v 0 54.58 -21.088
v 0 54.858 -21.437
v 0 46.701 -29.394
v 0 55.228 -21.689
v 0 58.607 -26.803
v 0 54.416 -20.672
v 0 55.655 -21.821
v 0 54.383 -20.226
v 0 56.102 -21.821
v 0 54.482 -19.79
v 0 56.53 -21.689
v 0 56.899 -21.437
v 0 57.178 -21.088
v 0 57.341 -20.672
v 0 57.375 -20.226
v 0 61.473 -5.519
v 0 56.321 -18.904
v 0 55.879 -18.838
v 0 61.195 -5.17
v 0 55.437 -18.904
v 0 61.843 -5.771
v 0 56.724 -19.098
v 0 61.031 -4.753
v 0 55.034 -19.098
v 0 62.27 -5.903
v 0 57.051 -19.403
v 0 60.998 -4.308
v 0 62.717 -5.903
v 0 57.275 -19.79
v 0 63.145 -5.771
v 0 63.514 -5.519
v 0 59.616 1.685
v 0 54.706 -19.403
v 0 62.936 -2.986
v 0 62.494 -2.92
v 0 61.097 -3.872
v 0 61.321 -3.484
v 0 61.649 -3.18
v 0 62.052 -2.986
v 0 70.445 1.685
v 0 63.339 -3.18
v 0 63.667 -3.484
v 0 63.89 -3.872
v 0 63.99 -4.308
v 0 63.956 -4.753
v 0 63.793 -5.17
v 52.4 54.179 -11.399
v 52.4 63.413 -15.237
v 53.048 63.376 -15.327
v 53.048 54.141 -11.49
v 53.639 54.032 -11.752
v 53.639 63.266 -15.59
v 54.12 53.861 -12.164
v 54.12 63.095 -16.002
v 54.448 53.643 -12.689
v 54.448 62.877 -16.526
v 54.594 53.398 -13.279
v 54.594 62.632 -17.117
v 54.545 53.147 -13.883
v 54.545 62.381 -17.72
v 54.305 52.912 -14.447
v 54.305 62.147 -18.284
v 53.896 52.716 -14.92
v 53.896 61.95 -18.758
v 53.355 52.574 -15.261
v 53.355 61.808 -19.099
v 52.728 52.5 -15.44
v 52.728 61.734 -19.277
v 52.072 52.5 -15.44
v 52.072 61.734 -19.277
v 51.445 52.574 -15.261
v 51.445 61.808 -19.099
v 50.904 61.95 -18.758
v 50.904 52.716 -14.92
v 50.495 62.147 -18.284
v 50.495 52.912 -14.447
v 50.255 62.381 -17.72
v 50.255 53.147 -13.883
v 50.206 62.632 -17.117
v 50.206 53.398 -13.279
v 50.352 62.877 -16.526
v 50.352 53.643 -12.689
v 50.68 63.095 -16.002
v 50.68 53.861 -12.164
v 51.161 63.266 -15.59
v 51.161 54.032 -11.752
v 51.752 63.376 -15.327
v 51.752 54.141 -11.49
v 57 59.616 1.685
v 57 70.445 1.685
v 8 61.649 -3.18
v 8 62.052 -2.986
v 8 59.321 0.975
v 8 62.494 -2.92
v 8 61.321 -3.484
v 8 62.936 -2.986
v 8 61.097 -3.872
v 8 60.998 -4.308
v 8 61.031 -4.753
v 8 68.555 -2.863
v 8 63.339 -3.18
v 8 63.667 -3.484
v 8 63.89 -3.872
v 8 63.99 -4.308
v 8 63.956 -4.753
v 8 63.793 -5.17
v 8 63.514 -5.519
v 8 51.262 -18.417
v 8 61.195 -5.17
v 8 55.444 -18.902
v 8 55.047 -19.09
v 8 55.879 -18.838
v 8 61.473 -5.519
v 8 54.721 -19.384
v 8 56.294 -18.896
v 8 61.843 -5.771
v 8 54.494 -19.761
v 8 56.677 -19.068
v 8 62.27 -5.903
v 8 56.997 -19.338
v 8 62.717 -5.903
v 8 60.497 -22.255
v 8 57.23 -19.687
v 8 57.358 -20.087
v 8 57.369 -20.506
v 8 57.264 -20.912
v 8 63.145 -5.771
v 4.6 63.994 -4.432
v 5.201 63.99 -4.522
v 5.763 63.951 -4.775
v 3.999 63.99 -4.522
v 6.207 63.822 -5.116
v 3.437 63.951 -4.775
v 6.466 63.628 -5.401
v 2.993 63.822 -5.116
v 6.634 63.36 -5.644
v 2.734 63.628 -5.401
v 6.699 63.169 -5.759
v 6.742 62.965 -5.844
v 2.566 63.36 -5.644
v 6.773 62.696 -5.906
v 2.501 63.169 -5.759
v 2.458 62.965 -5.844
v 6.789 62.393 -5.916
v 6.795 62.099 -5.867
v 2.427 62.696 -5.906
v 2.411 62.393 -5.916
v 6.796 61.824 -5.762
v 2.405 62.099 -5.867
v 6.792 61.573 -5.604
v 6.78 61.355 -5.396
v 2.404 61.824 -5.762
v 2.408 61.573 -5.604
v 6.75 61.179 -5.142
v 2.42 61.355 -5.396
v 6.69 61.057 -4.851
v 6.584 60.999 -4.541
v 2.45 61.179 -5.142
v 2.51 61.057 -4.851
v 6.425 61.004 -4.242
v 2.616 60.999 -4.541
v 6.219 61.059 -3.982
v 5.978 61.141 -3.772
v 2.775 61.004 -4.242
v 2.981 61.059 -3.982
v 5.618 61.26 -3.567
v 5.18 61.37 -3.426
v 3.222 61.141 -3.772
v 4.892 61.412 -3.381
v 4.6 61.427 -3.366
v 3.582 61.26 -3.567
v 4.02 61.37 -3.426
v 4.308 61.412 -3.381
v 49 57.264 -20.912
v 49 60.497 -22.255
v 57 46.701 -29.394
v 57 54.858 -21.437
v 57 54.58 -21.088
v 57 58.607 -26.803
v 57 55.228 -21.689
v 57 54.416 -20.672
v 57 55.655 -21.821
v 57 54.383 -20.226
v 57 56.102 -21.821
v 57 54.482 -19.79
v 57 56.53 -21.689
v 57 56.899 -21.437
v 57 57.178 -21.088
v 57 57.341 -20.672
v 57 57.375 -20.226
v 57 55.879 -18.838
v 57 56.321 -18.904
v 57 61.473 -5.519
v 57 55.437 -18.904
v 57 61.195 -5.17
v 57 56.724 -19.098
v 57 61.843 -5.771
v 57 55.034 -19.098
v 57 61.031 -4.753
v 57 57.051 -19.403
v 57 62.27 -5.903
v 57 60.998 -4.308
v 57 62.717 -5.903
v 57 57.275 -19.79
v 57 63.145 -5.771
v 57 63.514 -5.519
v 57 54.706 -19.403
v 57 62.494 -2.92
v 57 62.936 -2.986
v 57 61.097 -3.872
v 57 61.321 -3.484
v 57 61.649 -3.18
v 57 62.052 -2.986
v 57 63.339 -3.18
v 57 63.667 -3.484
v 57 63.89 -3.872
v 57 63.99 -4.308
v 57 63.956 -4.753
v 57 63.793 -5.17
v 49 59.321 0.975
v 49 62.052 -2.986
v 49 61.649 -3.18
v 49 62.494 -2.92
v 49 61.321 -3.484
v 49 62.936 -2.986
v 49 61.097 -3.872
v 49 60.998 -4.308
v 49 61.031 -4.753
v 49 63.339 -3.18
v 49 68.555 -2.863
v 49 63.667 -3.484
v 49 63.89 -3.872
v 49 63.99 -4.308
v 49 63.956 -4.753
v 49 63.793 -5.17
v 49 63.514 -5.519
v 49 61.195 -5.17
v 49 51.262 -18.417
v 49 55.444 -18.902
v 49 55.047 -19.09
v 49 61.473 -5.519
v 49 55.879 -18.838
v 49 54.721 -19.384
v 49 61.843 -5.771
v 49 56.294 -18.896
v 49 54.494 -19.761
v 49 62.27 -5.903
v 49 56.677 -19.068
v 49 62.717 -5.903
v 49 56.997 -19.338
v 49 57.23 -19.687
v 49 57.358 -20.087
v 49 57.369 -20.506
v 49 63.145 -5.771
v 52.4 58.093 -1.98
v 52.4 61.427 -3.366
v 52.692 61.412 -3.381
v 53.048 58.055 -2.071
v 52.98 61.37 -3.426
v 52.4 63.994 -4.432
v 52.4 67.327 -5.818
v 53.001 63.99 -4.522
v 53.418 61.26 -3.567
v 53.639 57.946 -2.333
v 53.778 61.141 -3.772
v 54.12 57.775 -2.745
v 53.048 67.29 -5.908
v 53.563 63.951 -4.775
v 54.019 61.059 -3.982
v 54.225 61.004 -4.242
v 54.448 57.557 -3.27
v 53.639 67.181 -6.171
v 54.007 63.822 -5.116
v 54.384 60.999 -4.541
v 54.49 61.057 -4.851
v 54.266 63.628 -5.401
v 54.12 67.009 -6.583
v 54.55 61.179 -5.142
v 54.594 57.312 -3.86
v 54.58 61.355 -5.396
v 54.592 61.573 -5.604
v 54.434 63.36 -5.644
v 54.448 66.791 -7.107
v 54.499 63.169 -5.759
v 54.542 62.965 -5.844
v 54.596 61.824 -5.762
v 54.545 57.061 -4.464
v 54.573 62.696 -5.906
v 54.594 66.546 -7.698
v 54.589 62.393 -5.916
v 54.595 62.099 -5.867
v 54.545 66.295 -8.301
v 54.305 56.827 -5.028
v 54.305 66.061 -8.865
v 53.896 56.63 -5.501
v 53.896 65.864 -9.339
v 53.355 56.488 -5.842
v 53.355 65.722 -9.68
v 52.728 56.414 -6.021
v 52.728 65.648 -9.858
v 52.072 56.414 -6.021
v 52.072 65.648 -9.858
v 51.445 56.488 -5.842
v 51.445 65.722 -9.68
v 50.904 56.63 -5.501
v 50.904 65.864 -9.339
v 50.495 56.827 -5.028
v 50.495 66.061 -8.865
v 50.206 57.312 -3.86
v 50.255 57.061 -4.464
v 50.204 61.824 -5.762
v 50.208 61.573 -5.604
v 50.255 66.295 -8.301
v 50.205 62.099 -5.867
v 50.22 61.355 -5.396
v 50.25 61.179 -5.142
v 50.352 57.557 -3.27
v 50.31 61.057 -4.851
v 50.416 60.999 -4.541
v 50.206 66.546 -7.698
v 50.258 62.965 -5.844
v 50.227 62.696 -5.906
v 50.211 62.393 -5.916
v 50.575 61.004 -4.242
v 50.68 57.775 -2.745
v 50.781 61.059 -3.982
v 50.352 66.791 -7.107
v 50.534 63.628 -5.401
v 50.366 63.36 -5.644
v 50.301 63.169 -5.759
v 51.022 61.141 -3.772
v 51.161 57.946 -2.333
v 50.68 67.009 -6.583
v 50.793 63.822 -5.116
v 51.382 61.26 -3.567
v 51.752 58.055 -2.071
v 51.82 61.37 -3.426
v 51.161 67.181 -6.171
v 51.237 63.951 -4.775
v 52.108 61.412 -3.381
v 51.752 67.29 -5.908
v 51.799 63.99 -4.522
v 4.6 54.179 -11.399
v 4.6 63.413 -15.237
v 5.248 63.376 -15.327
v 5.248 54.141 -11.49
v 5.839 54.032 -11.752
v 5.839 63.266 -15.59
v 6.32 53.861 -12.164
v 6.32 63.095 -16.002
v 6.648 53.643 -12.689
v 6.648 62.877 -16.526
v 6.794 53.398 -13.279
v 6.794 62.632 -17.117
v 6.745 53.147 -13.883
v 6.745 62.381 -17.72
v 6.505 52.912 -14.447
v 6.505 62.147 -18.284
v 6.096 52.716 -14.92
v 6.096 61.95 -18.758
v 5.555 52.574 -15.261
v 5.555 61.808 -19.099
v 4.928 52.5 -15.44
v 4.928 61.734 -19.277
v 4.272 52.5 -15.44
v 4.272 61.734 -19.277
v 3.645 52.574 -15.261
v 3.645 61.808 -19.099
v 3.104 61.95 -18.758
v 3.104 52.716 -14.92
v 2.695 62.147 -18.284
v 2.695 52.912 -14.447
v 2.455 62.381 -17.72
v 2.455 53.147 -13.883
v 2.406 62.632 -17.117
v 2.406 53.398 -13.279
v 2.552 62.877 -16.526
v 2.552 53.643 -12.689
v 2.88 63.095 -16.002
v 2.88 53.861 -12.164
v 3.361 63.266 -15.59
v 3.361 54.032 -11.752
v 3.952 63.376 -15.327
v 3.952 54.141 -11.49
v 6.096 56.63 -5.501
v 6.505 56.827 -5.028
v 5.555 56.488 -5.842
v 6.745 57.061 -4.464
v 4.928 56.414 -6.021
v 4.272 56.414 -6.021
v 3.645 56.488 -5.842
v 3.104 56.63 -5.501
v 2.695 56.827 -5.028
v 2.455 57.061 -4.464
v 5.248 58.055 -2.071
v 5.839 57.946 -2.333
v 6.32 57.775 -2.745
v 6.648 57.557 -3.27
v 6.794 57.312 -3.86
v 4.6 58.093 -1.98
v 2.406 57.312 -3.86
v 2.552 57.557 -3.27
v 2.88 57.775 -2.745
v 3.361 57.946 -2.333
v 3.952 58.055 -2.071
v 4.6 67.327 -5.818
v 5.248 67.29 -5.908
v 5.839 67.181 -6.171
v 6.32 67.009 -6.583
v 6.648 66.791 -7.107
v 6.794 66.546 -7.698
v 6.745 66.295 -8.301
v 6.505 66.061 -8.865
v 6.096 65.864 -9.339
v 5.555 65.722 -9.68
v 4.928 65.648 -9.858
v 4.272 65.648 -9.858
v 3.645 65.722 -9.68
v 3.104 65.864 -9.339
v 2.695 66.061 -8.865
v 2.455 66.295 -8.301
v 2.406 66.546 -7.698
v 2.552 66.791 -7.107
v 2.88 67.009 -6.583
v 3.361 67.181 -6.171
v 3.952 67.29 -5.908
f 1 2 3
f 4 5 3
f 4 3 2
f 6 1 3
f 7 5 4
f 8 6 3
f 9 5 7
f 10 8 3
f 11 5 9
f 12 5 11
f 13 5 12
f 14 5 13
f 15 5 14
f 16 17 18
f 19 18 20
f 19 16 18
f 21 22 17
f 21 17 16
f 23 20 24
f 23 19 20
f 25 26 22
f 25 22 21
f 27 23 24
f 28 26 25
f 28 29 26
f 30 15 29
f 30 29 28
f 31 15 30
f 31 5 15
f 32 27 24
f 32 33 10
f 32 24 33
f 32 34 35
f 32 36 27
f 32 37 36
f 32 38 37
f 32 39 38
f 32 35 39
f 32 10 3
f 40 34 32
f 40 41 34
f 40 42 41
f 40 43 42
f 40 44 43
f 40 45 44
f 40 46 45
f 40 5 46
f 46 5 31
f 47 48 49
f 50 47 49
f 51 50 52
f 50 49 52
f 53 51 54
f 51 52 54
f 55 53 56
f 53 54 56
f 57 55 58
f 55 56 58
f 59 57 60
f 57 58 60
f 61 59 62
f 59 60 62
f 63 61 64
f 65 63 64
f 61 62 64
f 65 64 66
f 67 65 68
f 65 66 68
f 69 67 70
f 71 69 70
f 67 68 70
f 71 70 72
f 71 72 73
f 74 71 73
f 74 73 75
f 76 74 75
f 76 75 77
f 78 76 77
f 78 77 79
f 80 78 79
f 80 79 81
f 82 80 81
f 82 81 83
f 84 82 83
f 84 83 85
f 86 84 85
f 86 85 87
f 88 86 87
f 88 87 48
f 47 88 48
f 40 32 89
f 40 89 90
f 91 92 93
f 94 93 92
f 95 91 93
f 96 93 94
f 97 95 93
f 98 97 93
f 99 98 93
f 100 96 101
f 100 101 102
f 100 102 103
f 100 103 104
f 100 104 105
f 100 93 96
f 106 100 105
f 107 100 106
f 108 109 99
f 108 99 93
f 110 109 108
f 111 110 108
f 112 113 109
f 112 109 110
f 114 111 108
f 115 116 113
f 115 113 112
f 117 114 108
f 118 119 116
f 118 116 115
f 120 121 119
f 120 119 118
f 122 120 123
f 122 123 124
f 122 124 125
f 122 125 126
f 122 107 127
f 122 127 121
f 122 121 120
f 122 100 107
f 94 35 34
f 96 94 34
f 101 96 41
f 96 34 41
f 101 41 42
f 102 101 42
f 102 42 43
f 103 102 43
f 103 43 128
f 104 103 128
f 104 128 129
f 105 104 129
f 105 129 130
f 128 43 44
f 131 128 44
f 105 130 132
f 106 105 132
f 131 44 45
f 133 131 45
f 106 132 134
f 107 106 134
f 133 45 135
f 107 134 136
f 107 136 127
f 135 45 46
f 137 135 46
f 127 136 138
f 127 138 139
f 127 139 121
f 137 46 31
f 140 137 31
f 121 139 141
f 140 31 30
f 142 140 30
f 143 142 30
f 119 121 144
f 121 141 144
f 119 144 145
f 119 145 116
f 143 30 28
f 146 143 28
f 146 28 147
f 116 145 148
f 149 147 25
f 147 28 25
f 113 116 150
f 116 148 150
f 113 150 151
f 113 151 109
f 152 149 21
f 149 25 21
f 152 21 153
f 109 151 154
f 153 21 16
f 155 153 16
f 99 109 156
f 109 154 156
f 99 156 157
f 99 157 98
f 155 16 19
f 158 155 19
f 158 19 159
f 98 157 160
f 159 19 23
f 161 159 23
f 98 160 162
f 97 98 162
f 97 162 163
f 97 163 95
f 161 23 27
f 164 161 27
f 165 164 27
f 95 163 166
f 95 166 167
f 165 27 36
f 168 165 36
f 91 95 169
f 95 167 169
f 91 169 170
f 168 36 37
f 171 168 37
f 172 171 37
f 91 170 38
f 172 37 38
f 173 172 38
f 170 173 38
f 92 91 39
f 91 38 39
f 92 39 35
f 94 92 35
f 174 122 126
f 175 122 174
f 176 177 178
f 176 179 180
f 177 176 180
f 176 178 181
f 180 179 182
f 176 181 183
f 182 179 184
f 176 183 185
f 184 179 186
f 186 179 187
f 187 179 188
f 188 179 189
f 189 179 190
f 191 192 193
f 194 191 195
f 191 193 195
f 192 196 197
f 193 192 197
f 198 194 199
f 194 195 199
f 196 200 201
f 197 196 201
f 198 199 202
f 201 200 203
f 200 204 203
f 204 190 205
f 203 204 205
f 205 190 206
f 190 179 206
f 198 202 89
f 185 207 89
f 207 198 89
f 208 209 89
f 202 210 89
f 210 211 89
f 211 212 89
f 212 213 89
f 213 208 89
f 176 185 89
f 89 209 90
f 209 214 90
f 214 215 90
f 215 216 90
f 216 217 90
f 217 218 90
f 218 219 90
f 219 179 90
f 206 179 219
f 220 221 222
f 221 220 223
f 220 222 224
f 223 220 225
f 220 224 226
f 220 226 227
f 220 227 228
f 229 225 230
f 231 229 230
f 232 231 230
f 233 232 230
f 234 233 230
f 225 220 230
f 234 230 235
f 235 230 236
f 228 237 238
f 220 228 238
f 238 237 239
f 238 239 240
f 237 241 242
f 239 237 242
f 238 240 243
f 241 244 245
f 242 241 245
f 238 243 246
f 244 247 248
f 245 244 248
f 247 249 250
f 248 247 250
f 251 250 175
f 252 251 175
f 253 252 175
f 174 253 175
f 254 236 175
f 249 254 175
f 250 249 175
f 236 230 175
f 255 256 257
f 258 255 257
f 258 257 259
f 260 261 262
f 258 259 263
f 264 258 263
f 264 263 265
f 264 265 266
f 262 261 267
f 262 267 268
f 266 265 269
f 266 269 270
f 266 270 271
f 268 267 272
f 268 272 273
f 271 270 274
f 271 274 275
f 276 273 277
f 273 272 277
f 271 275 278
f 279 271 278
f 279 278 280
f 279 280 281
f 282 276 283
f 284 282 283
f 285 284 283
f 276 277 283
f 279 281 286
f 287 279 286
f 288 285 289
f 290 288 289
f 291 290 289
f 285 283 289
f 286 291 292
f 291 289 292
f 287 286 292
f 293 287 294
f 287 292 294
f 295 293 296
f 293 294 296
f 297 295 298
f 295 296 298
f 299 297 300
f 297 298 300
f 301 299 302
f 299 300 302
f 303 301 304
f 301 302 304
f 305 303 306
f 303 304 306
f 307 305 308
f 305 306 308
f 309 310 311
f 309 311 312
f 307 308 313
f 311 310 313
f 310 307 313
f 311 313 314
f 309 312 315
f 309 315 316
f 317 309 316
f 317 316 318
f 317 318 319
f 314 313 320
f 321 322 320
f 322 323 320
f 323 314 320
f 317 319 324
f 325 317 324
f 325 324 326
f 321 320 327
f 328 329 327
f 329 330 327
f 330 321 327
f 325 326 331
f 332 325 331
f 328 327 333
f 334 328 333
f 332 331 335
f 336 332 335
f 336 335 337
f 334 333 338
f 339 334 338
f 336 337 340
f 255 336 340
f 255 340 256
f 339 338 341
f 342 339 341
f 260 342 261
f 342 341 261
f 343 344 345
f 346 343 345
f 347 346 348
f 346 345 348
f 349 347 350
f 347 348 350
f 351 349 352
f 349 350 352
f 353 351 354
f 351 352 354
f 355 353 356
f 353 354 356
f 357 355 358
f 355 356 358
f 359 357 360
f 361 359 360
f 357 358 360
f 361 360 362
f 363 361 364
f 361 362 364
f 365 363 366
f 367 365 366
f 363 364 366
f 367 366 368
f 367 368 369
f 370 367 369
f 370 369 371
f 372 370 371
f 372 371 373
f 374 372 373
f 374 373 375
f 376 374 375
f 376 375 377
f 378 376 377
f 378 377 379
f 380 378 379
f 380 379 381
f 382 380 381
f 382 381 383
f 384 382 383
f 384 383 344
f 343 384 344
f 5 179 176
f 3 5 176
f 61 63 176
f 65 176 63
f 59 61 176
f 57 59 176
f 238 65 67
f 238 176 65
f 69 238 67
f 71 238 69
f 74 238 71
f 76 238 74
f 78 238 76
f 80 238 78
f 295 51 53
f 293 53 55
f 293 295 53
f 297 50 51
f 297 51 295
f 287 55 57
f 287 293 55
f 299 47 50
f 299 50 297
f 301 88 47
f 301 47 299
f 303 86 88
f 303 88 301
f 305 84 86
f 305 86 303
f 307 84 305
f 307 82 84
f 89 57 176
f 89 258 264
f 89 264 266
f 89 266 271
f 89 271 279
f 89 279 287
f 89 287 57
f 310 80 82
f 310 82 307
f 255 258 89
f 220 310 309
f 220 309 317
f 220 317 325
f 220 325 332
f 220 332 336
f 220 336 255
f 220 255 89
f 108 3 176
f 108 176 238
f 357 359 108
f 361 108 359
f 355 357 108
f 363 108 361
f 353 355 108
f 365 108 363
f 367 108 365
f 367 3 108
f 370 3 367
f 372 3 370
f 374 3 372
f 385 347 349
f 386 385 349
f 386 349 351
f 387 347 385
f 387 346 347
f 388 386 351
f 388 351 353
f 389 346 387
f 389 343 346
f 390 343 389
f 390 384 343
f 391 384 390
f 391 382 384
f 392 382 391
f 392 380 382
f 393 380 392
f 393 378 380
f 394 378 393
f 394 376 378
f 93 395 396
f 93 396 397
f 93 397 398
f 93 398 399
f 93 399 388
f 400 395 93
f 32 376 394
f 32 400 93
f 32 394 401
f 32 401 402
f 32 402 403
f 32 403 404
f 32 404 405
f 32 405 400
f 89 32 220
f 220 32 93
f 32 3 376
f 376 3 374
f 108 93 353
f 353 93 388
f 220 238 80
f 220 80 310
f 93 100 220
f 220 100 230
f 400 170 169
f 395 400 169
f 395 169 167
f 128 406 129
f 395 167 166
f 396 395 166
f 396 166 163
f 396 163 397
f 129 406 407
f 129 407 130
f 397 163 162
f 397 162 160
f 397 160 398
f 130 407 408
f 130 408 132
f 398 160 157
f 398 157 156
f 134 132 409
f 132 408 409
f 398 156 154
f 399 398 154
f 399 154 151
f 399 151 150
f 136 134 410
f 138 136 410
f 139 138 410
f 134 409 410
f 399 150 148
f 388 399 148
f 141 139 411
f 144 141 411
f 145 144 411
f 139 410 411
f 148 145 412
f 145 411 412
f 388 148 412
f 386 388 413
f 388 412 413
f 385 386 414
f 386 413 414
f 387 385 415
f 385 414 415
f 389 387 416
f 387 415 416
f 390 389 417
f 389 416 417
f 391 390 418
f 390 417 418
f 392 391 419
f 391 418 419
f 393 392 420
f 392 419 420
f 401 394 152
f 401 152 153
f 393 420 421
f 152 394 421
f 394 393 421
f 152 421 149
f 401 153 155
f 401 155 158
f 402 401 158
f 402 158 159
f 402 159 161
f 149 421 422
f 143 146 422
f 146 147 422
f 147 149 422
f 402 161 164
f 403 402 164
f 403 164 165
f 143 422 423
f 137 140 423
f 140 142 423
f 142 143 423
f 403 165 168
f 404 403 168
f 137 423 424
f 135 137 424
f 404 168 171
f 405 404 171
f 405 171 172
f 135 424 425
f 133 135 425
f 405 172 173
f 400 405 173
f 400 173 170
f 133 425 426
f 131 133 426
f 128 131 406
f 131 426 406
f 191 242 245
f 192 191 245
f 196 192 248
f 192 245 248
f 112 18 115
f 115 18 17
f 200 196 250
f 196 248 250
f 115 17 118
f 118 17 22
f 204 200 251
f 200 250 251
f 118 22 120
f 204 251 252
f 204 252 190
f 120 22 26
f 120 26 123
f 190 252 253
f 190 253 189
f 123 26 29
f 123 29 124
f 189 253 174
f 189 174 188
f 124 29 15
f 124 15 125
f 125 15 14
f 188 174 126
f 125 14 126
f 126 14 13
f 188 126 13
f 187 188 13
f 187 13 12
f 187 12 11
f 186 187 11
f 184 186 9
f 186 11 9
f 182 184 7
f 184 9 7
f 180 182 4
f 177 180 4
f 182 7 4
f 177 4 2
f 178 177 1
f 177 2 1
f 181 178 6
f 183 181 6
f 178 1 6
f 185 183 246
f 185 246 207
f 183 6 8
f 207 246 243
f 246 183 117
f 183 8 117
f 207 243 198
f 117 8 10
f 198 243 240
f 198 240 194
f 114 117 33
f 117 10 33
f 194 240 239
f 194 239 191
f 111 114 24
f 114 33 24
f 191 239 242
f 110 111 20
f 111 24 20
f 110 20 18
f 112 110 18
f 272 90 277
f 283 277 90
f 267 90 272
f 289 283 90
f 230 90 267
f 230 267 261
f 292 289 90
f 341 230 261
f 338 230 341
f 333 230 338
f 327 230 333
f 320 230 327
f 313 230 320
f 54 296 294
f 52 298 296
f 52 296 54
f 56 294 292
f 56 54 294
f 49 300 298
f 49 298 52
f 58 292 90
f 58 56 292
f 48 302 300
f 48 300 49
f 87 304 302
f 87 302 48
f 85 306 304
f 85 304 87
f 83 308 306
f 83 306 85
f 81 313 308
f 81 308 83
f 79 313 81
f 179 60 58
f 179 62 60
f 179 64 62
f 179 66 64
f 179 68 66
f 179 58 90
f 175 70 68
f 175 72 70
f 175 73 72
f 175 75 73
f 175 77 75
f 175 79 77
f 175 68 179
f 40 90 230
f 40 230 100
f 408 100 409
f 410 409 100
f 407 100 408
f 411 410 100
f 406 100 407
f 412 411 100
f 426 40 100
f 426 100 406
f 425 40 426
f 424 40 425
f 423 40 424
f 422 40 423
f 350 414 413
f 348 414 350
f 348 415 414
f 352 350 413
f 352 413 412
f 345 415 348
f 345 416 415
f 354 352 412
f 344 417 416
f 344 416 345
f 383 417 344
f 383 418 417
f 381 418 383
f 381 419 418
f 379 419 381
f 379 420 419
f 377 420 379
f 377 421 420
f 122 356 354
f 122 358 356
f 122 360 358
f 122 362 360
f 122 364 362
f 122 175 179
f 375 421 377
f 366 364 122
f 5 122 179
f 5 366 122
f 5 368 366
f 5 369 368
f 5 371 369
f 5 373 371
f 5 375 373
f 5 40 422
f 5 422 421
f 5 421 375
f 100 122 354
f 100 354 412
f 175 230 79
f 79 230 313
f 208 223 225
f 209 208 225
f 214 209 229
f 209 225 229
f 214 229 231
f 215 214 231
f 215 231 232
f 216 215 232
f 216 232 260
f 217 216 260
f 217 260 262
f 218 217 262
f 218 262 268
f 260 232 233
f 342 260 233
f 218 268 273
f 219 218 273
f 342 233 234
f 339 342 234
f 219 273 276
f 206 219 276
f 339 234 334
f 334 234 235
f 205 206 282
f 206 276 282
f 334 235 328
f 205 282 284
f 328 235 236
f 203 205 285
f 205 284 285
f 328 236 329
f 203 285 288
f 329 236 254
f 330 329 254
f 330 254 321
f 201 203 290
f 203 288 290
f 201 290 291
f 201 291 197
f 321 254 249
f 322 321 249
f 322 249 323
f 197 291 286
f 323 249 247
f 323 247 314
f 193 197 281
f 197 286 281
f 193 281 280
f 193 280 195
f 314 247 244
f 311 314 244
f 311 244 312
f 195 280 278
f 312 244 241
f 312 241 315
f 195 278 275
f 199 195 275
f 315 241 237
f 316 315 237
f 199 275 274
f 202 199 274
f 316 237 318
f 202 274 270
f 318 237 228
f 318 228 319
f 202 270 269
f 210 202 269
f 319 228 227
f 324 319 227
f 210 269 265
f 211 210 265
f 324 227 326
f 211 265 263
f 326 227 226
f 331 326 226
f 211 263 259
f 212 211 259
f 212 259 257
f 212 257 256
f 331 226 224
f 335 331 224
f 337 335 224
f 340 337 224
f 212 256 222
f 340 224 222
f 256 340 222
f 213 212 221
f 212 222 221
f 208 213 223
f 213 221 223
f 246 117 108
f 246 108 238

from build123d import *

# Parameters (mm, degrees)
SALIENTE_EXTRUIR1_DEPTH = 57
CROQUIS2_W              = 41
CROQUIS2_H              = 21
CORTAR_EXTRUIR1_DEPTH   = 40
CROQUIS3_R              = 1.5
CORTAR_EXTRUIR2_DEPTH   = 96.265502635
CROQUIS4_R              = 2.2
CORTAR_EXTRUIR3_DEPTH   = 95


with BuildPart() as part:
    # Croquis1 → Saliente-Extruir1 (new body)
    with BuildSketch(Plane(origin=(0, 0, 0), x_dir=(0, 0, -1), z_dir=(1, 0, 0))):
        Polygon((-1.684944658, 59.616081723), (-1.684944658, 70.445194562), (26.80274982, 58.606617394), (29.39371626, 46.700781546), align=None)
    extrude(amount=SALIENTE_EXTRUIR1_DEPTH)

    # Croquis2 → Cortar-Extruir1 (cut)
    with BuildSketch(Plane(origin=(0, 59.474011024, -24.71550197), x_dir=(1, 0, 0), z_dir=(0, 0.9234366793713986, -0.38375082956460804))):
        with Locations((28.5, -13.164518651)):
            Rectangle(CROQUIS2_W, CROQUIS2_H)
    extrude(amount=-CORTAR_EXTRUIR1_DEPTH, mode=Mode.SUBTRACT)

    # Croquis3 → Cortar-Extruir2 (cut, through all)
    with BuildSketch(Plane.ZY):
        with Locations((-20.337749265, 55.878708995)):
            Circle(CROQUIS3_R)
        with Locations((-4.419674199, 62.493753261)):
            Circle(CROQUIS3_R)
    extrude(amount=-CORTAR_EXTRUIR2_DEPTH, mode=Mode.SUBTRACT)

    # Croquis4 → Cortar-Extruir3 (cut)
    with BuildSketch(Plane(origin=(0, 59.474011024, -24.71550197), x_dir=(1, 0, 0), z_dir=(0, 0.9234366793713987, -0.3837508295646078))):
        with Locations(Location((4.6, -18.264518651, 0), (0, 0, 270))):
            Circle(CROQUIS4_R)
        with Locations(Location((4.6, -8.064518651, 0), (0, 0, 270))):
            Circle(CROQUIS4_R)
        with Locations(Location((52.4, -18.264518651, 0), (0, 0, 270))):
            Circle(CROQUIS4_R)
        with Locations(Location((52.4, -8.064518651, 0), (0, 0, 270))):
            Circle(CROQUIS4_R)
    extrude(amount=-CORTAR_EXTRUIR3_DEPTH, mode=Mode.SUBTRACT)


solid = part.part
